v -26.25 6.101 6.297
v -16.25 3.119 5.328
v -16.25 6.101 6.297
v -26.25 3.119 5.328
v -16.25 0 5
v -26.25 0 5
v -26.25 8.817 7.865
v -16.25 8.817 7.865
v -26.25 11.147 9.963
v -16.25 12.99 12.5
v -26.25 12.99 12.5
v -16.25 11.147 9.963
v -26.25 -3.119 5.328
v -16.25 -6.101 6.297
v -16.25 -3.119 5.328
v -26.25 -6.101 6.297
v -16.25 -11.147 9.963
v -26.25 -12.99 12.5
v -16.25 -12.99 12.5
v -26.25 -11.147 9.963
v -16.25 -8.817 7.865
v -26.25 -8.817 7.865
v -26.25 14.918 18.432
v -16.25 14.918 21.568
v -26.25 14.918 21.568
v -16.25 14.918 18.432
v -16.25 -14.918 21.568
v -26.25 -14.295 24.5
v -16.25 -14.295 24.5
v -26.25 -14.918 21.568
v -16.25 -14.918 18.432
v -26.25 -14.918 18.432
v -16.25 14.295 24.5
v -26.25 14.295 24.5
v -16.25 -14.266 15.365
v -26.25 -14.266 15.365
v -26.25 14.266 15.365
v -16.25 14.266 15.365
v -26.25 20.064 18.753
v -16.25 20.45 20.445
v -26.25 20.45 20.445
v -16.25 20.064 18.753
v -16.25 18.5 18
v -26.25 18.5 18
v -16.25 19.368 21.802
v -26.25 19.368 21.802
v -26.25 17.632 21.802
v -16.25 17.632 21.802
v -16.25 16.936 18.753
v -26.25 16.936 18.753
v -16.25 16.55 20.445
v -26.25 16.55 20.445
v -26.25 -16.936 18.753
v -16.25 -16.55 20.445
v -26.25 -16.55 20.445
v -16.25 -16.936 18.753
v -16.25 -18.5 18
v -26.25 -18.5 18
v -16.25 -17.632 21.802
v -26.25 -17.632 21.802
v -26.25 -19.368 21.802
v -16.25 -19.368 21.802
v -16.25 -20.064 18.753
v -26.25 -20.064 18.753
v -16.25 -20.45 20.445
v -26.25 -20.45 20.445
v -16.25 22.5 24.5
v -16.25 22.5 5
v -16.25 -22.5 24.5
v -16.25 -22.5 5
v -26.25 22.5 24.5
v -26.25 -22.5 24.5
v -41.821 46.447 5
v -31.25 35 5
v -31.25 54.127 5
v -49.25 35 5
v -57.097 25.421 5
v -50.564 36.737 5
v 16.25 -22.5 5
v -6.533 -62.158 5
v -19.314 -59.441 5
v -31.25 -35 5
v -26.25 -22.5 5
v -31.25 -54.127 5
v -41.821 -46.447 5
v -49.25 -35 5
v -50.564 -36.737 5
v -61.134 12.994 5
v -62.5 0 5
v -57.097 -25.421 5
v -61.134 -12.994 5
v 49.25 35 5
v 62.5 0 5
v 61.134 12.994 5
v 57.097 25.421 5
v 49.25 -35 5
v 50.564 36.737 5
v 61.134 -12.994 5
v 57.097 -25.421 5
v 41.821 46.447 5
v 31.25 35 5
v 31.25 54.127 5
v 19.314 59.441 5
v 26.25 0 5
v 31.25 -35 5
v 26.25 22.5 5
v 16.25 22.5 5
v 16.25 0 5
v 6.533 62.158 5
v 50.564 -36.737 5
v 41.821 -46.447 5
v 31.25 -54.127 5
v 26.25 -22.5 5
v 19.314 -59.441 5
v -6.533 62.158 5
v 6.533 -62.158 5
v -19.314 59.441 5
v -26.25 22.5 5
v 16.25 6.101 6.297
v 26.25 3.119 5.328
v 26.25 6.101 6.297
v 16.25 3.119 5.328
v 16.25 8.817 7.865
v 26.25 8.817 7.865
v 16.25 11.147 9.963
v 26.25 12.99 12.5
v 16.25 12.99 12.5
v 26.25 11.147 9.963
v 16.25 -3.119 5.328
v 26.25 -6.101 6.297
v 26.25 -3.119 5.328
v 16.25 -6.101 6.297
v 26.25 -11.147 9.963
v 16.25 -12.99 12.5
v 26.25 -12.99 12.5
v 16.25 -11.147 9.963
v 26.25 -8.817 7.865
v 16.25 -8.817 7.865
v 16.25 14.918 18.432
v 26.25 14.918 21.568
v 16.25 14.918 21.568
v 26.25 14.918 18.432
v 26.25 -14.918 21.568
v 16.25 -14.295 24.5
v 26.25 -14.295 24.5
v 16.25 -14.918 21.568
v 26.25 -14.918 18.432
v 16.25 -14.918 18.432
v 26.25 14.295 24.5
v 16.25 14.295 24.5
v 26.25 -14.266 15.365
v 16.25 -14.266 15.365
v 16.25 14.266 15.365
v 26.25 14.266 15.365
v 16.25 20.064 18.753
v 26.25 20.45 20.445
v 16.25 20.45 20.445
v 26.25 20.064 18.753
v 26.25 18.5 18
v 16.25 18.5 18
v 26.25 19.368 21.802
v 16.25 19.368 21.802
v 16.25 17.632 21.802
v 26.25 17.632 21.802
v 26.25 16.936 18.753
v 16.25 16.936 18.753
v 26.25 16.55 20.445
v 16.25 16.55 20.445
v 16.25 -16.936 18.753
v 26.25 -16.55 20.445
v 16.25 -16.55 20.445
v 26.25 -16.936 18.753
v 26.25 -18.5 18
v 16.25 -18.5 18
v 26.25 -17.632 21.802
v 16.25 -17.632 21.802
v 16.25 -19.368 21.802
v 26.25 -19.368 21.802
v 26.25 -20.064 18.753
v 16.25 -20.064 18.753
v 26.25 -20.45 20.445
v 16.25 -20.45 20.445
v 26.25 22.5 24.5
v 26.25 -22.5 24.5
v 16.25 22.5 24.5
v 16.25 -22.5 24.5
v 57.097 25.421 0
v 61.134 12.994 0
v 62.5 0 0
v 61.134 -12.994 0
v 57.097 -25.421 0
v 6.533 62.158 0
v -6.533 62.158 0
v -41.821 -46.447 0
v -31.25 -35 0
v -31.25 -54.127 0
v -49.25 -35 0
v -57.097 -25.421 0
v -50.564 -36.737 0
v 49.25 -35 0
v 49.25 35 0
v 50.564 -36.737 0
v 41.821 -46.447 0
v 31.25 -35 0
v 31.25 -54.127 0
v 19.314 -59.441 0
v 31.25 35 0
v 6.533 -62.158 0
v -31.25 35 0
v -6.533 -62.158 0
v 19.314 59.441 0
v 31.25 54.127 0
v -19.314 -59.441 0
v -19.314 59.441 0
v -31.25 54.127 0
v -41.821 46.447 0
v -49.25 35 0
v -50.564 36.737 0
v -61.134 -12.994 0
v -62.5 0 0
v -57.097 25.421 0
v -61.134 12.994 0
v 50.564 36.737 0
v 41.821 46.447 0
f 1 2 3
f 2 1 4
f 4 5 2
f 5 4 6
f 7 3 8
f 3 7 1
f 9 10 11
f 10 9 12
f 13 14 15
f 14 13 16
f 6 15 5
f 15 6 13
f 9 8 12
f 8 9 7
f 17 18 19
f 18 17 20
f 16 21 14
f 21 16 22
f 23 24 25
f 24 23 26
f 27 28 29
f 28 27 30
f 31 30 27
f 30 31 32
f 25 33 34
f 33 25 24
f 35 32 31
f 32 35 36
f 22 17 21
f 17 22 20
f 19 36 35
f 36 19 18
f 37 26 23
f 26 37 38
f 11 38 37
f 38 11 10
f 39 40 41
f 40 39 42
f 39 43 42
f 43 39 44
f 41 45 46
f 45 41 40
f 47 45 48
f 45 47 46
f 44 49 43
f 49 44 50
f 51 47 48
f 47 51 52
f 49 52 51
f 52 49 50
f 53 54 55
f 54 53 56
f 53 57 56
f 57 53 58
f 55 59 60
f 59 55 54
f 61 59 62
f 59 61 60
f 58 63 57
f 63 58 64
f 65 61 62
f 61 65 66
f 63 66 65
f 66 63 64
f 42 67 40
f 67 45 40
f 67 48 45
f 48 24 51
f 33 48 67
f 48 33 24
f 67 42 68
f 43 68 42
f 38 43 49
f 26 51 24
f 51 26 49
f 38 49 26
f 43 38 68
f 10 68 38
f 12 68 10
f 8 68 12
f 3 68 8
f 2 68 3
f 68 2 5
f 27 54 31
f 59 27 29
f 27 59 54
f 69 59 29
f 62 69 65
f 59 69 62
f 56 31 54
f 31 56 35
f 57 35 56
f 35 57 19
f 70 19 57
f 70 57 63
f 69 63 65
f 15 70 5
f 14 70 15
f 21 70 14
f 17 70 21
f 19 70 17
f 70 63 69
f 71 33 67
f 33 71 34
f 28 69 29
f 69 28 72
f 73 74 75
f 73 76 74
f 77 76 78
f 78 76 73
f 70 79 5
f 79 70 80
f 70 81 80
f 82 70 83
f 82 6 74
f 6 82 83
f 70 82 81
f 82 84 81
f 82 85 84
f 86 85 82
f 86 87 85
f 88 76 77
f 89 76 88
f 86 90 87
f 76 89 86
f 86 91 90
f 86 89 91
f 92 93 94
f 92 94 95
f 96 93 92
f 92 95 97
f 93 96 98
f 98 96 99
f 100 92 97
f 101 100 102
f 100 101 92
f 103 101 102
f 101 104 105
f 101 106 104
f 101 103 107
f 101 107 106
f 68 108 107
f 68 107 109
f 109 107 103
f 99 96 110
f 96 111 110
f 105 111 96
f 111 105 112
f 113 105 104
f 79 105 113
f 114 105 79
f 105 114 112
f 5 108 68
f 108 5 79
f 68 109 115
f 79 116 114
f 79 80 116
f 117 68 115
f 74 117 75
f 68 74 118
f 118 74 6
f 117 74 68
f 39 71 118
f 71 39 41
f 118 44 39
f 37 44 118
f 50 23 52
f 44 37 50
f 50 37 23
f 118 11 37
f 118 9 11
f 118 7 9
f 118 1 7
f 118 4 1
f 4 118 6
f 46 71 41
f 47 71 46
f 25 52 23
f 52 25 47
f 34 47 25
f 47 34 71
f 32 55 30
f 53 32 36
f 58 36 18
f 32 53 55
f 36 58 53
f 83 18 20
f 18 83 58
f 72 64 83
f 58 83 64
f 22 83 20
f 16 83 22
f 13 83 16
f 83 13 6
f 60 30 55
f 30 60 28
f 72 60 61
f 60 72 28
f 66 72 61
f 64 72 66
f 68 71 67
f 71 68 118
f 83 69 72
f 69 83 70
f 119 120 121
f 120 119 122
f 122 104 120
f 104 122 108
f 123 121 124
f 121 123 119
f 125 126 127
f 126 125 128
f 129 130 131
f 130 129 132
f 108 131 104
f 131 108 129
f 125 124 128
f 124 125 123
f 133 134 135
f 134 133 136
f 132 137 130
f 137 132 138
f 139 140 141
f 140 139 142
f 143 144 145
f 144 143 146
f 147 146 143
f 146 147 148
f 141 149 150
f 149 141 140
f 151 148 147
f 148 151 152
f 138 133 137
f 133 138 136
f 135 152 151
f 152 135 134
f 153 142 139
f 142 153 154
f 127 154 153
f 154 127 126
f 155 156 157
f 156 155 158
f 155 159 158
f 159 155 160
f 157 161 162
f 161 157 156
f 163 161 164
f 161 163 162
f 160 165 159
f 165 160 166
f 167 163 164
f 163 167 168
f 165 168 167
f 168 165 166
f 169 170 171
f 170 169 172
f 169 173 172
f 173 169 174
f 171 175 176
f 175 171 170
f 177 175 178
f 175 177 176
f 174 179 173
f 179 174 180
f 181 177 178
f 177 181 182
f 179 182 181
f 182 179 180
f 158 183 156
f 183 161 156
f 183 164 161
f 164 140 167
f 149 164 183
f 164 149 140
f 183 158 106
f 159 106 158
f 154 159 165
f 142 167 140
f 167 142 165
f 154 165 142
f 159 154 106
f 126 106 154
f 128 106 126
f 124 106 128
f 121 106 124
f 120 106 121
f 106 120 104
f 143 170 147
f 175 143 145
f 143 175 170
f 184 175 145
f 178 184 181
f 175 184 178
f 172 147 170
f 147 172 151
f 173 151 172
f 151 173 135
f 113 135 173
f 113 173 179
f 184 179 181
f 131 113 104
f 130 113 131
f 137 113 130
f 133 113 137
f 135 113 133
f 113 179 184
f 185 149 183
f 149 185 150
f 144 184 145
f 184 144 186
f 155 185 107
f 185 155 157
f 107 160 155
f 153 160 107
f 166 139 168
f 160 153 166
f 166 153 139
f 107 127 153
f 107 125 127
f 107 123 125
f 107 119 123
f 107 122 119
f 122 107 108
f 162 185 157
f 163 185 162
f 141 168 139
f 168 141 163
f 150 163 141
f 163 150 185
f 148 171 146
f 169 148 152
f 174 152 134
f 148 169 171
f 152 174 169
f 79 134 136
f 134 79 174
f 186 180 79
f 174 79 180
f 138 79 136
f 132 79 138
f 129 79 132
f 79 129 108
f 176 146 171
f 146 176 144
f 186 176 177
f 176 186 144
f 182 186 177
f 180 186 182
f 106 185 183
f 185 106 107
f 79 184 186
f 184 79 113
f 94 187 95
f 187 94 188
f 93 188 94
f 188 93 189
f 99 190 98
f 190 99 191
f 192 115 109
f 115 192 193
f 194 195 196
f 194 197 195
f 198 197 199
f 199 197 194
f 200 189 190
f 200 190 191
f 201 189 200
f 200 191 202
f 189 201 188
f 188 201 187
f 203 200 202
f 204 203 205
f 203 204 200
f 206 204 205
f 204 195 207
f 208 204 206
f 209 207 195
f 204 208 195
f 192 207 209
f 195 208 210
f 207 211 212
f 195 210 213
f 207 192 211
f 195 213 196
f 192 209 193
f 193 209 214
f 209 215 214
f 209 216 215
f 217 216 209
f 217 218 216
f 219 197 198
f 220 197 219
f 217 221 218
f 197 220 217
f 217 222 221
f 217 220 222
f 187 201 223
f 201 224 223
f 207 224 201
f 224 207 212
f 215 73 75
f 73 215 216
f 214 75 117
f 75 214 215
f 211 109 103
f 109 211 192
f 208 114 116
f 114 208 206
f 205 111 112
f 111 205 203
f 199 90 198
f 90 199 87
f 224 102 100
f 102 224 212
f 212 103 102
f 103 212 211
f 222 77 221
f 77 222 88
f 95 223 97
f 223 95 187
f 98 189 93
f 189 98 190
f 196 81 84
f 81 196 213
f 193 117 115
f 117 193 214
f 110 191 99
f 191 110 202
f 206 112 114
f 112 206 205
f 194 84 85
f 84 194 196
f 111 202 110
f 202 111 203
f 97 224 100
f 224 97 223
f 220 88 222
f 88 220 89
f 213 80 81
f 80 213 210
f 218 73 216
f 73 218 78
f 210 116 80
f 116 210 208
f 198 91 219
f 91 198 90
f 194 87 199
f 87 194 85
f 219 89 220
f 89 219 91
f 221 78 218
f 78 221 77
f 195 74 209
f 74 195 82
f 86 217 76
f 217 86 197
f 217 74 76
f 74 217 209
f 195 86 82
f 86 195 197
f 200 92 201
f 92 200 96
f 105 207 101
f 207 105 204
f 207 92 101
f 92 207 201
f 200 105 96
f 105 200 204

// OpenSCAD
deck_diameter = 125;
deck_thickness = 5;
wheel_opening_length = 70;
wheel_opening_width = 18;
motor_diameter = 30;
motor_flange = 45;
motor_mount_width = 10;
motor_shaft_offset = 5;
motor_screw_hole = 4;
motor_screw_offset = 3.5;

difference(){

	union(){
		// main deck
		cylinder(r=deck_diameter / 2,h=deck_thickness);

		// motor mounts
		translate([-(deck_diameter/4)+motor_shaft_offset,-motor_flange/2,deck_thickness]){
			difference(){
				cube([motor_mount_width,motor_flange,motor_diameter*.65]);
				translate([-1,motor_flange/2,motor_diameter/2]){
					rotate([0,90,0]){
						#cylinder(r=motor_diameter/2,h=12);
						translate([0,(motor_diameter/2) + motor_screw_offset,0]){
							#cylinder(r=motor_screw_hole/2,h=motor_mount_width+2);
						}
						translate([0,-(motor_diameter/2) - motor_screw_offset,0]){
							#cylinder(r=motor_screw_hole/2,h=motor_mount_width+2);
						}
					}
				}
			}
		}
		translate([((deck_diameter/4)-motor_mount_width)-motor_shaft_offset,-motor_flange/2,deck_thickness]){
			difference(){
				cube([motor_mount_width,motor_flange,motor_diameter*.65]);
				translate([-1,motor_flange/2,motor_diameter/2]){
					rotate([0,90,0]){
						#cylinder(r=motor_diameter/2,h=12);
						translate([0,(motor_diameter/2) + motor_screw_offset,0]){
							#cylinder(r=motor_screw_hole/2,h=motor_mount_width+2);
						}
						translate([0,-(motor_diameter/2) - motor_screw_offset,0]){
							#cylinder(r=motor_screw_hole/2,h=motor_mount_width+2);
						}
					}
				}
			}
		}
	}

	// wheel openings
	translate([-(deck_diameter/4)-wheel_opening_width,-wheel_opening_length/2,-1]){
		cube([wheel_opening_width, wheel_opening_length, 10]);
	}
	translate([(deck_diameter/4),-wheel_opening_length/2,-1]){
		cube([wheel_opening_width, wheel_opening_length, 10]);
	}
}
